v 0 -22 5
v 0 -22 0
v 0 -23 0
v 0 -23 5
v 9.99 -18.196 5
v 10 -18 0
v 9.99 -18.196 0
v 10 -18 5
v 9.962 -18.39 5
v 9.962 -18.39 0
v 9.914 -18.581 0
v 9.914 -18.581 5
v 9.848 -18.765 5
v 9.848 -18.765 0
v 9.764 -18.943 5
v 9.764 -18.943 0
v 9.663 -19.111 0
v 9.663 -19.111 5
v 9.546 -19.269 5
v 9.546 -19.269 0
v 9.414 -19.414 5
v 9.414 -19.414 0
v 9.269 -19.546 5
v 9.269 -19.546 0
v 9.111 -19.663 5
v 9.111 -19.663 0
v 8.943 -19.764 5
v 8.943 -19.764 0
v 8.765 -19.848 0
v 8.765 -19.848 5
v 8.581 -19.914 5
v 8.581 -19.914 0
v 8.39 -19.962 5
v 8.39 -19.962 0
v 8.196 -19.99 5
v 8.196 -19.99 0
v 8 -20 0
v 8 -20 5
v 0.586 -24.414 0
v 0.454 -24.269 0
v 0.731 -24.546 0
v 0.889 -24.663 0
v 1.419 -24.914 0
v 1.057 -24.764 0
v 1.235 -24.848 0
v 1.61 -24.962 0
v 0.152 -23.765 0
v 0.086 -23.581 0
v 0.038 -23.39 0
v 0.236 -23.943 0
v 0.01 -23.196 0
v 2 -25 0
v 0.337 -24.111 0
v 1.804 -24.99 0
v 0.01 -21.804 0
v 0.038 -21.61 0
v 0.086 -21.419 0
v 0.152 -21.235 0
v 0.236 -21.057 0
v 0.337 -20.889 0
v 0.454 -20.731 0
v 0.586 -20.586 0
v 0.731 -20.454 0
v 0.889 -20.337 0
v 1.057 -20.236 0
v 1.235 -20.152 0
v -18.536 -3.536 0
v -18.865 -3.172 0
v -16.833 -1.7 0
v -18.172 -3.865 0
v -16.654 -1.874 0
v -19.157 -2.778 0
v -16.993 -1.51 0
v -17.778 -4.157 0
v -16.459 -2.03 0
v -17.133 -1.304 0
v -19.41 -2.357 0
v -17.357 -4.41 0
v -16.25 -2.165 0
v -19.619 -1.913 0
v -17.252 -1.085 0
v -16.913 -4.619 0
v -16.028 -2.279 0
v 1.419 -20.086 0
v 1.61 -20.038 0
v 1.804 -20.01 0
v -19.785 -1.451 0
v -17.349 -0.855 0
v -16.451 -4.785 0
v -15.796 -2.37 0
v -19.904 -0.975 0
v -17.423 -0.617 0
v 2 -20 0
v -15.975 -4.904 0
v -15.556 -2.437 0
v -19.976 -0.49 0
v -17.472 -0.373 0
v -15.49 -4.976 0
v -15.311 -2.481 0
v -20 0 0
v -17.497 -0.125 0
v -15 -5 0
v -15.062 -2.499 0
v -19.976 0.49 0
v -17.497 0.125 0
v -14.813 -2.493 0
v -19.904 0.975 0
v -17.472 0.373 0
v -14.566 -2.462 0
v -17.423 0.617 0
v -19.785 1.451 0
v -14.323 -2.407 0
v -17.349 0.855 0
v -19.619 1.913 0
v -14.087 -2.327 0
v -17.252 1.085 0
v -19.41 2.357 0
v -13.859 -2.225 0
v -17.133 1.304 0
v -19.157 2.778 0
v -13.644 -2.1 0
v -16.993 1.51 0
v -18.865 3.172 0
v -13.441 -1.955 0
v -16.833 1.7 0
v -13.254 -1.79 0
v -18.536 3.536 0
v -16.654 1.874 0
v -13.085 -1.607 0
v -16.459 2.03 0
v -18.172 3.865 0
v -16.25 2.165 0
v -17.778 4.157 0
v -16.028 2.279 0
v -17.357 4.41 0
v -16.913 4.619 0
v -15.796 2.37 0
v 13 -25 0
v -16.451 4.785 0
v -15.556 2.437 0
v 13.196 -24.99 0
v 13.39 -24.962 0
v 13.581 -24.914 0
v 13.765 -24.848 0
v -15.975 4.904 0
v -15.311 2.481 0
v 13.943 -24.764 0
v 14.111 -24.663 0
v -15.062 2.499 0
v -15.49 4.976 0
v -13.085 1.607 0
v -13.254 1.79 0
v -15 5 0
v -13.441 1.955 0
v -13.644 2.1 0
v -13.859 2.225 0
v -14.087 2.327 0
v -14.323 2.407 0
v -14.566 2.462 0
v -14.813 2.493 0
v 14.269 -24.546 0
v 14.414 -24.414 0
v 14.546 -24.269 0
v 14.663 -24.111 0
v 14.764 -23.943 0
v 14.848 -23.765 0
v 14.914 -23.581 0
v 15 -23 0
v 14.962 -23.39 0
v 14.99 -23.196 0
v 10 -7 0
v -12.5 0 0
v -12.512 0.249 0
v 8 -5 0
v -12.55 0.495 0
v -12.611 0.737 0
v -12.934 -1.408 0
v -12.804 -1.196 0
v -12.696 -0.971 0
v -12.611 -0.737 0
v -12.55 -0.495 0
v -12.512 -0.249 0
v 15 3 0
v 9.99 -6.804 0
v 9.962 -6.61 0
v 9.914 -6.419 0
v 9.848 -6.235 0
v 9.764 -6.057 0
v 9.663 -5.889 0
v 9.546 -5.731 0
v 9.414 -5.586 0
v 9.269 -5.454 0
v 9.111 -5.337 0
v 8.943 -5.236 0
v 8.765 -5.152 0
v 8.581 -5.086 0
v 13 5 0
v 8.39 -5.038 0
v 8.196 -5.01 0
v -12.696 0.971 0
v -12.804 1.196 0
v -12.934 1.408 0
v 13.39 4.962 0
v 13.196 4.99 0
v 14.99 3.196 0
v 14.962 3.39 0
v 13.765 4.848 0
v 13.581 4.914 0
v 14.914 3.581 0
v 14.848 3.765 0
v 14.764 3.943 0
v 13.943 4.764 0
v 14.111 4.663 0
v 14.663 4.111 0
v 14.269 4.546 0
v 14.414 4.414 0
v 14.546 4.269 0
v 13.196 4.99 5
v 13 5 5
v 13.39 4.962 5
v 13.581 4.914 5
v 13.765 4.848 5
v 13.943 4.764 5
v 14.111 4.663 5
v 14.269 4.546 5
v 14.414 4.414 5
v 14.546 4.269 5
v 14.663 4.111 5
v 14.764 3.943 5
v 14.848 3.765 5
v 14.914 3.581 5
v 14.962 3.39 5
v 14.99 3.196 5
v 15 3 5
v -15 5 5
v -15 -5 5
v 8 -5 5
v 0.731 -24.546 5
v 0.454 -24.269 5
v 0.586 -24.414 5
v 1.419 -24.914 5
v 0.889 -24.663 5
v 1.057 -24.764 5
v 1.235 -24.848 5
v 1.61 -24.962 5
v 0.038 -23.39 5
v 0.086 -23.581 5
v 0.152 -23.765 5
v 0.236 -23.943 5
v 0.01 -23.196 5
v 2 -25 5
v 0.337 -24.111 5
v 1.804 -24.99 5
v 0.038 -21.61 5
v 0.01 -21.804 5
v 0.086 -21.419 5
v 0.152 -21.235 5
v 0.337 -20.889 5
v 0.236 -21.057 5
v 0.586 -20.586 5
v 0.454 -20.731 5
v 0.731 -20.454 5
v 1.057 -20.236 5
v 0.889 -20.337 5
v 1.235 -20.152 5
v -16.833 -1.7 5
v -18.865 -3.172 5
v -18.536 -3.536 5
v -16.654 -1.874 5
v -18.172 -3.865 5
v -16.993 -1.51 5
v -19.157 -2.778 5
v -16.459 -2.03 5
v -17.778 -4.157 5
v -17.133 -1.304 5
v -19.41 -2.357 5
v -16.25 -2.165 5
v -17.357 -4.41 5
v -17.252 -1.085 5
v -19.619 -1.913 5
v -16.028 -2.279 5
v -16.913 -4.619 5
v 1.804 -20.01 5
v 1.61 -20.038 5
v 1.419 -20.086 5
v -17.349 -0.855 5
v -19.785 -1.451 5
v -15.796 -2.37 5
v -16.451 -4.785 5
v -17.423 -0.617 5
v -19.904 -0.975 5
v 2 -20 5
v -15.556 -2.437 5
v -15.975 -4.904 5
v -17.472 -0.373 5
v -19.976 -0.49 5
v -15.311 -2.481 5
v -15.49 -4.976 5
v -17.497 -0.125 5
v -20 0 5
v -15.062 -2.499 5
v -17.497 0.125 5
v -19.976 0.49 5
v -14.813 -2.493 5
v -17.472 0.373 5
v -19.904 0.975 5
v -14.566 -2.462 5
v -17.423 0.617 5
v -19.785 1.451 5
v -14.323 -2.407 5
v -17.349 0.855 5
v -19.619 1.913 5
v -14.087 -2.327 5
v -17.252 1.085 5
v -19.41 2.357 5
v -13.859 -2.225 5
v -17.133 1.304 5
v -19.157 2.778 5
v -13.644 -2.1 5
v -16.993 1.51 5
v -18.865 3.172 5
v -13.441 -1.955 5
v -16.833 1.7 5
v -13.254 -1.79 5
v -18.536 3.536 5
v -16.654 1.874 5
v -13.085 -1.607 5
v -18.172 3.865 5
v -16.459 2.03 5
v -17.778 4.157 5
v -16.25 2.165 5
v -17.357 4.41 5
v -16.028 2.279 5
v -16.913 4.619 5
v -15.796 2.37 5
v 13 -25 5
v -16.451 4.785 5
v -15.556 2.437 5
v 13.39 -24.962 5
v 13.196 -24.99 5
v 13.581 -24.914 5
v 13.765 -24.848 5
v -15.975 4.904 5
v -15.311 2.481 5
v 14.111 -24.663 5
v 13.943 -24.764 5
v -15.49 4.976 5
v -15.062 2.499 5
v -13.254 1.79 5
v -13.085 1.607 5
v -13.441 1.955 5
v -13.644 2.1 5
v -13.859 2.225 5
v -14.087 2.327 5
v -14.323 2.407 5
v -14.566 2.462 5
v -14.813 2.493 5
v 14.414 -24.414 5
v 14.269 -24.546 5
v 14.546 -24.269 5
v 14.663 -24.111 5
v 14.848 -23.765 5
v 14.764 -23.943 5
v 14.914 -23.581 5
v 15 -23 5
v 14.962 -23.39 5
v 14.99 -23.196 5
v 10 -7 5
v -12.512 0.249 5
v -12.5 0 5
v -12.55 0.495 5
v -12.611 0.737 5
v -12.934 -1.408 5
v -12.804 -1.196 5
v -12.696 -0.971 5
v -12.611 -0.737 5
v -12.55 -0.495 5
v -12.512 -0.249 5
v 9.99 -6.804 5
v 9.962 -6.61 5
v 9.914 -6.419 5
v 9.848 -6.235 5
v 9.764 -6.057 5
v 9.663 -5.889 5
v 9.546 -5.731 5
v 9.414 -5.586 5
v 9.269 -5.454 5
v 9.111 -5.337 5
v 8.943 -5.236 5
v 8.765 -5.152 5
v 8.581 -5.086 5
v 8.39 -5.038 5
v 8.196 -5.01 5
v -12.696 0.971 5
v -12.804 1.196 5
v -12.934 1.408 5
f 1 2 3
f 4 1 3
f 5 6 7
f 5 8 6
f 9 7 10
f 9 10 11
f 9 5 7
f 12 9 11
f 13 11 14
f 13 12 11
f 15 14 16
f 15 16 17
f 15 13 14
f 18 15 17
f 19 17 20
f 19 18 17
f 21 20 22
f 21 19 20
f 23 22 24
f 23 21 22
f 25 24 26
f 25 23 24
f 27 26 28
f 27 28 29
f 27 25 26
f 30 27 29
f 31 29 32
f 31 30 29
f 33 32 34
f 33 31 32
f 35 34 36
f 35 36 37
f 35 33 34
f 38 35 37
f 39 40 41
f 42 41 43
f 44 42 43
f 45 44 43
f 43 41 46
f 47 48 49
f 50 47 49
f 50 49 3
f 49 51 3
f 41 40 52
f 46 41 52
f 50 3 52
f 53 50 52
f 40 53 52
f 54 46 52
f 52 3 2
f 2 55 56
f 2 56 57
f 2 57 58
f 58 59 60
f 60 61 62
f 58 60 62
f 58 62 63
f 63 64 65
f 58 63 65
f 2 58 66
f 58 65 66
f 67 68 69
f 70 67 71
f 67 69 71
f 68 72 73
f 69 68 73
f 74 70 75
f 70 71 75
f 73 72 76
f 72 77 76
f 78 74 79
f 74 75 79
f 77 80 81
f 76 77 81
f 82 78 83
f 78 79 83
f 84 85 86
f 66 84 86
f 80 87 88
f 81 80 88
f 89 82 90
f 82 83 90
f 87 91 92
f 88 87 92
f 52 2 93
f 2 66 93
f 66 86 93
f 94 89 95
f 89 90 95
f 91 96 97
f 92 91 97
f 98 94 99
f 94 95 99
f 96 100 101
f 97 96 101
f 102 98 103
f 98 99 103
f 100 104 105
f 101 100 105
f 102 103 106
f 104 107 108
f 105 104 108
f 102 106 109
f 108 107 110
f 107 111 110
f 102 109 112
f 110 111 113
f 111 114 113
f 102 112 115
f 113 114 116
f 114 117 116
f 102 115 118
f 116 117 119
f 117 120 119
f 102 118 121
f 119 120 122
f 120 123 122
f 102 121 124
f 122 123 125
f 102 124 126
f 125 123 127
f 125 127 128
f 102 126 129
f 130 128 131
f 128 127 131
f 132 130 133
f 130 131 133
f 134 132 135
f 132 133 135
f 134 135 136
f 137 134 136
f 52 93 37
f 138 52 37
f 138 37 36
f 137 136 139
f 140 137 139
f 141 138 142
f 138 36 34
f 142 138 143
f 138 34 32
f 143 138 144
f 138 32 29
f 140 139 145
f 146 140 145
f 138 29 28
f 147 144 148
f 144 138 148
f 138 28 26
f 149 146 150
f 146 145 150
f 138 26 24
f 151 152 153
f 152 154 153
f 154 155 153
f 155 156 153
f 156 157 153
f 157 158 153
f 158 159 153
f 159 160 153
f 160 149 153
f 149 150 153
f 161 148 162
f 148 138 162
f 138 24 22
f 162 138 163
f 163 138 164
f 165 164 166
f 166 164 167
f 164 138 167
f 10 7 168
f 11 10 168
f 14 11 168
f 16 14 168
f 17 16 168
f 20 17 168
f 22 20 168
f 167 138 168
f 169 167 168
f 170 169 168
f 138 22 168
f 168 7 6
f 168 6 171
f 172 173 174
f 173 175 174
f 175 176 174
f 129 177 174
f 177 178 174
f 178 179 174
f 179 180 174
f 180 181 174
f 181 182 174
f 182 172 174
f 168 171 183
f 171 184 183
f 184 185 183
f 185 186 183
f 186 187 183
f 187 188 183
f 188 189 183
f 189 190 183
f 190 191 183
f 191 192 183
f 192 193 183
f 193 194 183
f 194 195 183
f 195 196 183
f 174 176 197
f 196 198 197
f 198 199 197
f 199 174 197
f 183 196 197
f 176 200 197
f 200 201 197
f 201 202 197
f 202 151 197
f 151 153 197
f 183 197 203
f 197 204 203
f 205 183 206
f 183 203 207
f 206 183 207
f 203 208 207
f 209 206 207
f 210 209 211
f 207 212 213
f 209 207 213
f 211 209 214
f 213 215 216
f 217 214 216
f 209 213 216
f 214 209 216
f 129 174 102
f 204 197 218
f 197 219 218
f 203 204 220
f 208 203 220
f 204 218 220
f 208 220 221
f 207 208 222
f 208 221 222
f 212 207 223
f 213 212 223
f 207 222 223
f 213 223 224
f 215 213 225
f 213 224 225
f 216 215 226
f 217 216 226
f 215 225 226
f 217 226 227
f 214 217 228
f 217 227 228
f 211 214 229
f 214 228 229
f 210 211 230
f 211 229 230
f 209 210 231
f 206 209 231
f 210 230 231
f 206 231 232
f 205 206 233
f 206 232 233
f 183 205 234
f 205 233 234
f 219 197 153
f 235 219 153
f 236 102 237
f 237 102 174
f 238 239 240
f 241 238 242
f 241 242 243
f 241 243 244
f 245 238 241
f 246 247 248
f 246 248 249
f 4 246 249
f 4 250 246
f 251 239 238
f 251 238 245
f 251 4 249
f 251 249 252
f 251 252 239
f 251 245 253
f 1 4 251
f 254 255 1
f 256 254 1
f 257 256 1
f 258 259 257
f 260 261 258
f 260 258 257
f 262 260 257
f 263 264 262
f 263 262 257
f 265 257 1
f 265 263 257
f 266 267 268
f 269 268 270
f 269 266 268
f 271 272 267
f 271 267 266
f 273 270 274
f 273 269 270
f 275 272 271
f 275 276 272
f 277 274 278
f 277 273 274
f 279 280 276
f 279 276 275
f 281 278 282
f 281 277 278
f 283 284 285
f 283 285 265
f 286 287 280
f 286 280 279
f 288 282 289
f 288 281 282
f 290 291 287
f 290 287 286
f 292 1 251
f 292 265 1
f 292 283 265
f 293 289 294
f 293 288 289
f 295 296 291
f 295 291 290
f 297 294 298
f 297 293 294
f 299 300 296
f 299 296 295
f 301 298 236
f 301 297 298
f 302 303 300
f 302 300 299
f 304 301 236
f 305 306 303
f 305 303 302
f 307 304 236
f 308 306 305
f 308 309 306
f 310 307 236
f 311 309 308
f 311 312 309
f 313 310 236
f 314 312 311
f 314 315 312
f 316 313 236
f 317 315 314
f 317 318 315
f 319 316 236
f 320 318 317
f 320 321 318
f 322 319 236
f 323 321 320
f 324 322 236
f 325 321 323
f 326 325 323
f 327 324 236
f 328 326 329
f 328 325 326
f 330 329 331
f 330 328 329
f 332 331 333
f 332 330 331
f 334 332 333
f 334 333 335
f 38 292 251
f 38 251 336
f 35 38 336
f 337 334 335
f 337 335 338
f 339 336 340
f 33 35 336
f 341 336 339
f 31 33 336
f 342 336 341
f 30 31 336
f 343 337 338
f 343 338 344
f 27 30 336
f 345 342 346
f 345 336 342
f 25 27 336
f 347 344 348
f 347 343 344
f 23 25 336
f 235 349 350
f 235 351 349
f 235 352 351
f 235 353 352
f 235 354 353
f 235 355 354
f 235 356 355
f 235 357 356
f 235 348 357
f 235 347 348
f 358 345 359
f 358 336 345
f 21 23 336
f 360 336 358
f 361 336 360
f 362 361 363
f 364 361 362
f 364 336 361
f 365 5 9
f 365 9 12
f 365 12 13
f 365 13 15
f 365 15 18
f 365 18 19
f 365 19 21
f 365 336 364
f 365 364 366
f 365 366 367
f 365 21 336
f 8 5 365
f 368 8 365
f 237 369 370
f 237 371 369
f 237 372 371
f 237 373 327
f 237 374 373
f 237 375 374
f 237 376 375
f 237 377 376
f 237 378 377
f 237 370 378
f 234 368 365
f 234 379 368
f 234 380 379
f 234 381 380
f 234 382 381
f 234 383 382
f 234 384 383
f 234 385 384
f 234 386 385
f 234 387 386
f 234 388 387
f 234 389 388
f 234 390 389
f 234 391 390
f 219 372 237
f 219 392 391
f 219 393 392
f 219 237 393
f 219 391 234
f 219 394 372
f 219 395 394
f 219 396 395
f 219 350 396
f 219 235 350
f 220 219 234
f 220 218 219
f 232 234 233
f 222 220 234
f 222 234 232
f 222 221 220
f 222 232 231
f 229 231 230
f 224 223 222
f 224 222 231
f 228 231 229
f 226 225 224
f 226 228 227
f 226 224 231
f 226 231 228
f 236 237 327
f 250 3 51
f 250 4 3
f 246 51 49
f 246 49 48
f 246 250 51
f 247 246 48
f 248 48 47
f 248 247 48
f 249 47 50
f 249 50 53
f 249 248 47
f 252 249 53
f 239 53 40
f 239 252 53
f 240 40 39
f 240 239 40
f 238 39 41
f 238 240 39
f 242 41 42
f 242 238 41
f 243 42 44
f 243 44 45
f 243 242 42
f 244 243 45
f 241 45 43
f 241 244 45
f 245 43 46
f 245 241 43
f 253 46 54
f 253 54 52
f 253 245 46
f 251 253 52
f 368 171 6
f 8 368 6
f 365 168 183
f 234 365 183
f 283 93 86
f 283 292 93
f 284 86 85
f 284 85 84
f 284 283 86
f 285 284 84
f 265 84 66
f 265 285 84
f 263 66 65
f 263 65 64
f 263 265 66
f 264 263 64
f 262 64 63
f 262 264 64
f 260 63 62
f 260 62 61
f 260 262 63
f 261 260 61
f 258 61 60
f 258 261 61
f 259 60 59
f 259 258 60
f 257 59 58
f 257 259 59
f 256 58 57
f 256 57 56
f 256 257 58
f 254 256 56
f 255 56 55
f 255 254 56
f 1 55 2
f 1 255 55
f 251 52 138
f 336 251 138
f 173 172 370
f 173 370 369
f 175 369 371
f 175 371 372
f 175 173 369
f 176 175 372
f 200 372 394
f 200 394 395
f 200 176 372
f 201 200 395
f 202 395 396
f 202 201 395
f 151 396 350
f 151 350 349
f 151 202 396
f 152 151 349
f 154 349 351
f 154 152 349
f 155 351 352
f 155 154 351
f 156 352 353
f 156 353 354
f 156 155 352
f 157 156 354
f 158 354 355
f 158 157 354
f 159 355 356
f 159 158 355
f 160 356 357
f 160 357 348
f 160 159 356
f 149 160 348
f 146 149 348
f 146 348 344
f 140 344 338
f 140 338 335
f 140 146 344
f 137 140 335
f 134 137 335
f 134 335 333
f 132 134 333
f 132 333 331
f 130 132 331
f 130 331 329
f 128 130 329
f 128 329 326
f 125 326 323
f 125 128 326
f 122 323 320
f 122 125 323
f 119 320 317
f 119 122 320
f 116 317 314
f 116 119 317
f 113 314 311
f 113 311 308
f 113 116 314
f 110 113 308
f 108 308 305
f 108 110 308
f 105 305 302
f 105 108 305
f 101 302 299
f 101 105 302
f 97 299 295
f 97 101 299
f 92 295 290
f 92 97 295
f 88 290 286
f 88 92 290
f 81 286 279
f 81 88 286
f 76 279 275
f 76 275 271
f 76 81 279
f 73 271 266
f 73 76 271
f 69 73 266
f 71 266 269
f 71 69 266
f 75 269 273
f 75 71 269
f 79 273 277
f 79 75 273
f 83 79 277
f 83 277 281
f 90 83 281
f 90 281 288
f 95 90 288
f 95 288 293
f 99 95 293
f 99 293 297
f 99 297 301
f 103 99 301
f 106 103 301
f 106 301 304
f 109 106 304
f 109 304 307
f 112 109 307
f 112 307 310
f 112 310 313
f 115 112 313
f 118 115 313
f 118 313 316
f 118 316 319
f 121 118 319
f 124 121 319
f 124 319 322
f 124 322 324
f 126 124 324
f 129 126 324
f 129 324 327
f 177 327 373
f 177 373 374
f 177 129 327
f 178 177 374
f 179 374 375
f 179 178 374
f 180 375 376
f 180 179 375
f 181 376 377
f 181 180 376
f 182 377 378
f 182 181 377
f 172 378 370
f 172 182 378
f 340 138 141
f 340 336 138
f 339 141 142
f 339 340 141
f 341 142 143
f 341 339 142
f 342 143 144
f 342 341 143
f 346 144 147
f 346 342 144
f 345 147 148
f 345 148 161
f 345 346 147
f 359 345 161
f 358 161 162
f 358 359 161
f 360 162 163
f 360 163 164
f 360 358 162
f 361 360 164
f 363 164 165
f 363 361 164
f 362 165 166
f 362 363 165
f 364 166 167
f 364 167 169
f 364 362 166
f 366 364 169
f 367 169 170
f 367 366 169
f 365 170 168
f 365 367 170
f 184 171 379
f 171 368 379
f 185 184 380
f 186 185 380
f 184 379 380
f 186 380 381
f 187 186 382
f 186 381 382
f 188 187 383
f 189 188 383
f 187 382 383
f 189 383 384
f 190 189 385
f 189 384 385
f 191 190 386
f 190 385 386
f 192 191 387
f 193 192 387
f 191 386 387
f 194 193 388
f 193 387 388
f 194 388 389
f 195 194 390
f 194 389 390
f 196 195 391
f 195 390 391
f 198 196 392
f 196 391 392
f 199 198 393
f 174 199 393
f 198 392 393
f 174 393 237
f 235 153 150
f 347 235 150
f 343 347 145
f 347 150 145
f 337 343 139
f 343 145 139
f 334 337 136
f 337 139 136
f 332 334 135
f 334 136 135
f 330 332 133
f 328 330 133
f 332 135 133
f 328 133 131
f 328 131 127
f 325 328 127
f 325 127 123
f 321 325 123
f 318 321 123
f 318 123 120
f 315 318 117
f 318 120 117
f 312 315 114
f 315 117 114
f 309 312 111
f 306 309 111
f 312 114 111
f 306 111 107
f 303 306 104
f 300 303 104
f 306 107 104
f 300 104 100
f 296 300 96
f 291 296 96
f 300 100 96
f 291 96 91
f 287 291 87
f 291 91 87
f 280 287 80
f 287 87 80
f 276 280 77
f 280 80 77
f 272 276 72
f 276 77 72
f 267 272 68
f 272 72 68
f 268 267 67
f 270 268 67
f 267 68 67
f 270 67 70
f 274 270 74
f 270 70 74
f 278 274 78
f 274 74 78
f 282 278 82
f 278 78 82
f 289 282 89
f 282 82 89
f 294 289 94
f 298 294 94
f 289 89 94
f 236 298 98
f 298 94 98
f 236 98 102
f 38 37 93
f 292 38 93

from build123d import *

# Parameters (mm, degrees)
ESQUISSE1_R        = 2.5
BOSS_EXTRU_1_DEPTH = 5
CONG_1_R           = 2


with BuildPart() as part:
    # Esquisse1 → Boss.-Extru.1 (new body)
    with BuildSketch(Plane.XY):
        with BuildLine():
            Line((10, -5), (10, -20))
            Line((10, -20), (0, -20))
            Line((0, -20), (0, -25))
            Line((0, -25), (15, -25))
            Line((15, -25), (15, -5))
            Line((15, -5), (15, 5))
            Line((15, 5), (-15, 5))
            ThreePointArc((-15, 5), (-20, 0), (-15, -5))
            Line((-15, -5), (10, -5))
        make_face()
        with Locations((-15, 0)):
            Circle(ESQUISSE1_R, mode=Mode.SUBTRACT)
    extrude(amount=BOSS_EXTRU_1_DEPTH)

    # Congé1
    cong_1_edges = [part.edges().sort_by_distance(p)[0] for p in [
        (15, -25, 2.5),
        (0, -25, 2.5),
        (0, -20, 2.5),
        (10, -20, 2.5),
        (10, -5, 2.5),
        (15, 5, 2.5),
    ]]
    fillet(cong_1_edges, radius=CONG_1_R)


solid = part.part
